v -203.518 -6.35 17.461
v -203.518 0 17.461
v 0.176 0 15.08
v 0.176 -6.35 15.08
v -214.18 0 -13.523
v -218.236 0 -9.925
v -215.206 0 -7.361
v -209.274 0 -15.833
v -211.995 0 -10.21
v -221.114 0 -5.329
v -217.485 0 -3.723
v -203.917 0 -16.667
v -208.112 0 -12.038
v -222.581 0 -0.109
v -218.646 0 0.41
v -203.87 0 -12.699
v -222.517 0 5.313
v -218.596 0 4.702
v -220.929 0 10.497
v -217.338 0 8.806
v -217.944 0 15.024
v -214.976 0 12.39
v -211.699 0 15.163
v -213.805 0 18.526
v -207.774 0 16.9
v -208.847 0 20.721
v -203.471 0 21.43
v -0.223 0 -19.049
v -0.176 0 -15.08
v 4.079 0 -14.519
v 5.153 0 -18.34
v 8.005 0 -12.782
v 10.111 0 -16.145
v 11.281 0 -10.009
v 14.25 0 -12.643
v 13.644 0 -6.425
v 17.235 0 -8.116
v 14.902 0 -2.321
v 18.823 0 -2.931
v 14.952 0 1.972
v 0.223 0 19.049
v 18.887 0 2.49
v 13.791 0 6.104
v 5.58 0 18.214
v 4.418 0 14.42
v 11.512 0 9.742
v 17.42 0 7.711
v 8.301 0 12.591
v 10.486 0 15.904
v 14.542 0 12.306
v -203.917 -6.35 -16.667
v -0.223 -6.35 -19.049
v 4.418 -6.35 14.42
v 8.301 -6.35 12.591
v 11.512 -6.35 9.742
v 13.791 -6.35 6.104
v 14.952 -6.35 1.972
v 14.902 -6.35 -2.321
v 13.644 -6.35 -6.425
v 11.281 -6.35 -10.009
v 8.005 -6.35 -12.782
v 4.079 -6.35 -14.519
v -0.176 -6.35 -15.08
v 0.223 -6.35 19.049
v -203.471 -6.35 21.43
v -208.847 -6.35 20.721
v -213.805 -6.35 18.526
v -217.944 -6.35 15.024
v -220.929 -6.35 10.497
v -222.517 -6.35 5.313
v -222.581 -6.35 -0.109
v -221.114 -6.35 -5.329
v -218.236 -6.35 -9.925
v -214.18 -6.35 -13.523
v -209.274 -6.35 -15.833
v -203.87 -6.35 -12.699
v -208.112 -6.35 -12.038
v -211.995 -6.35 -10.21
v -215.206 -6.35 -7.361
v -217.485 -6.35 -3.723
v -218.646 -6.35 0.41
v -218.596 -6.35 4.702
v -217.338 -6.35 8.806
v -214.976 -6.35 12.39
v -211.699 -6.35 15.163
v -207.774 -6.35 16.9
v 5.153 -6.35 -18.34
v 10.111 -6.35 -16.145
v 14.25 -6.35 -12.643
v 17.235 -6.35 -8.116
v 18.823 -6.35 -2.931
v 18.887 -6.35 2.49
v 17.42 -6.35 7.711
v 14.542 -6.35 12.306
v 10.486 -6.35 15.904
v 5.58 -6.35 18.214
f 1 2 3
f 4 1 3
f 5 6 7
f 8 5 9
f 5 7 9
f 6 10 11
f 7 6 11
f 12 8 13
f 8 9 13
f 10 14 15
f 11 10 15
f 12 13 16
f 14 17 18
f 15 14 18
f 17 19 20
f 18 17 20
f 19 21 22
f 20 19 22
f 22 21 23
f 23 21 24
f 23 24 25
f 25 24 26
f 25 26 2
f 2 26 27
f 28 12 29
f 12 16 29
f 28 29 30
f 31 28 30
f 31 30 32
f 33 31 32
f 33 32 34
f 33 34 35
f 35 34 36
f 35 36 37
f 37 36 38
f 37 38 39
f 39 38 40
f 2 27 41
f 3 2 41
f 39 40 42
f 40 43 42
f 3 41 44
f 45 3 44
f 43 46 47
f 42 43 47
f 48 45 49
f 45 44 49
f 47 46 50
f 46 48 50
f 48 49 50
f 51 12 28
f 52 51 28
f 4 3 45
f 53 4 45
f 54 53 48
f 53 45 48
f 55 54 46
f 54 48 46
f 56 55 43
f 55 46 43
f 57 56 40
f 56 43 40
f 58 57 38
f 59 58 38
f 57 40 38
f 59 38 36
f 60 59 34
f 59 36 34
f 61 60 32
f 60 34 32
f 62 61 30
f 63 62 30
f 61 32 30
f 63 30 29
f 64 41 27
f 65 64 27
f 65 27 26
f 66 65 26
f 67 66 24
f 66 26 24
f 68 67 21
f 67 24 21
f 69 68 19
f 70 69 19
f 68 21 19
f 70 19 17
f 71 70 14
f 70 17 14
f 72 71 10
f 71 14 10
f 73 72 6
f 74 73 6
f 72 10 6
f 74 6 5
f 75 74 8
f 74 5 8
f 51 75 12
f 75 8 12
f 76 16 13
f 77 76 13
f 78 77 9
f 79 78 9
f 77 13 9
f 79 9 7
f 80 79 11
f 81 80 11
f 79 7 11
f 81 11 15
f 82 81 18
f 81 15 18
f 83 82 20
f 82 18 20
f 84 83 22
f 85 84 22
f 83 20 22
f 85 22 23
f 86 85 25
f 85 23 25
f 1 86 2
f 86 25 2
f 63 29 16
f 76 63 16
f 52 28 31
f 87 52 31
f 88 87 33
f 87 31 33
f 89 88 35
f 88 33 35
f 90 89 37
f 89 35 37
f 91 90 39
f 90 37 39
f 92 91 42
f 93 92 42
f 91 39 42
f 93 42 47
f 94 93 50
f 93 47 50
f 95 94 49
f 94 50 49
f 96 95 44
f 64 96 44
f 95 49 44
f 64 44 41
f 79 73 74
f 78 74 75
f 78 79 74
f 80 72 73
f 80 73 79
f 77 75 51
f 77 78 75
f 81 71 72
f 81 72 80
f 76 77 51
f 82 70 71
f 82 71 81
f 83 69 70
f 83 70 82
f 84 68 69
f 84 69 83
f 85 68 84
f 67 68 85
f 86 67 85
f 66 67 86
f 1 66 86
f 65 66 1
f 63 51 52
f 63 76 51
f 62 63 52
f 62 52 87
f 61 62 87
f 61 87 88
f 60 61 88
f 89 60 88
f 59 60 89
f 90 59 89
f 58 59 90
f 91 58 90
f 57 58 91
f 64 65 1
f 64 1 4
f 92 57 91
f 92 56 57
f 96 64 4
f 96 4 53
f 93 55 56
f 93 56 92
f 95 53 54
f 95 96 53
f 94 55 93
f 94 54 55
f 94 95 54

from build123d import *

# Parameters (mm, degrees)
F1_DEPTH = 6.35


with BuildPart() as f1:
    # F0 (on Front) → F1 (new body)
    with BuildSketch(Plane.XZ):
        with BuildLine():
            Line((0.222685, 19.048698), (-203.471396, 21.429948))
            ThreePointArc((-203.471396, 21.429948), (-222.74278, 2.603935), (-203.916767, -16.667448))
            Line((-203.916767, -16.667448), (-0.222685, -19.048698))
            ThreePointArc((-0.222685, -19.048698), (19.048698, -0.222685), (0.222685, 19.048698))
        make_face()
        with BuildLine():
            Line((-0.176293, -15.08022), (-203.870374, -12.69897))
            ThreePointArc((-203.870374, -12.69897), (-218.774301, 2.557543), (-203.517789, 17.46147))
            Line((-203.517789, 17.46147), (0.176293, 15.08022))
            ThreePointArc((0.176293, 15.08022), (15.08022, -0.176293), (-0.176293, -15.08022))
        make_face(mode=Mode.SUBTRACT)
    extrude(amount=F1_DEPTH)


solid = f1.part
